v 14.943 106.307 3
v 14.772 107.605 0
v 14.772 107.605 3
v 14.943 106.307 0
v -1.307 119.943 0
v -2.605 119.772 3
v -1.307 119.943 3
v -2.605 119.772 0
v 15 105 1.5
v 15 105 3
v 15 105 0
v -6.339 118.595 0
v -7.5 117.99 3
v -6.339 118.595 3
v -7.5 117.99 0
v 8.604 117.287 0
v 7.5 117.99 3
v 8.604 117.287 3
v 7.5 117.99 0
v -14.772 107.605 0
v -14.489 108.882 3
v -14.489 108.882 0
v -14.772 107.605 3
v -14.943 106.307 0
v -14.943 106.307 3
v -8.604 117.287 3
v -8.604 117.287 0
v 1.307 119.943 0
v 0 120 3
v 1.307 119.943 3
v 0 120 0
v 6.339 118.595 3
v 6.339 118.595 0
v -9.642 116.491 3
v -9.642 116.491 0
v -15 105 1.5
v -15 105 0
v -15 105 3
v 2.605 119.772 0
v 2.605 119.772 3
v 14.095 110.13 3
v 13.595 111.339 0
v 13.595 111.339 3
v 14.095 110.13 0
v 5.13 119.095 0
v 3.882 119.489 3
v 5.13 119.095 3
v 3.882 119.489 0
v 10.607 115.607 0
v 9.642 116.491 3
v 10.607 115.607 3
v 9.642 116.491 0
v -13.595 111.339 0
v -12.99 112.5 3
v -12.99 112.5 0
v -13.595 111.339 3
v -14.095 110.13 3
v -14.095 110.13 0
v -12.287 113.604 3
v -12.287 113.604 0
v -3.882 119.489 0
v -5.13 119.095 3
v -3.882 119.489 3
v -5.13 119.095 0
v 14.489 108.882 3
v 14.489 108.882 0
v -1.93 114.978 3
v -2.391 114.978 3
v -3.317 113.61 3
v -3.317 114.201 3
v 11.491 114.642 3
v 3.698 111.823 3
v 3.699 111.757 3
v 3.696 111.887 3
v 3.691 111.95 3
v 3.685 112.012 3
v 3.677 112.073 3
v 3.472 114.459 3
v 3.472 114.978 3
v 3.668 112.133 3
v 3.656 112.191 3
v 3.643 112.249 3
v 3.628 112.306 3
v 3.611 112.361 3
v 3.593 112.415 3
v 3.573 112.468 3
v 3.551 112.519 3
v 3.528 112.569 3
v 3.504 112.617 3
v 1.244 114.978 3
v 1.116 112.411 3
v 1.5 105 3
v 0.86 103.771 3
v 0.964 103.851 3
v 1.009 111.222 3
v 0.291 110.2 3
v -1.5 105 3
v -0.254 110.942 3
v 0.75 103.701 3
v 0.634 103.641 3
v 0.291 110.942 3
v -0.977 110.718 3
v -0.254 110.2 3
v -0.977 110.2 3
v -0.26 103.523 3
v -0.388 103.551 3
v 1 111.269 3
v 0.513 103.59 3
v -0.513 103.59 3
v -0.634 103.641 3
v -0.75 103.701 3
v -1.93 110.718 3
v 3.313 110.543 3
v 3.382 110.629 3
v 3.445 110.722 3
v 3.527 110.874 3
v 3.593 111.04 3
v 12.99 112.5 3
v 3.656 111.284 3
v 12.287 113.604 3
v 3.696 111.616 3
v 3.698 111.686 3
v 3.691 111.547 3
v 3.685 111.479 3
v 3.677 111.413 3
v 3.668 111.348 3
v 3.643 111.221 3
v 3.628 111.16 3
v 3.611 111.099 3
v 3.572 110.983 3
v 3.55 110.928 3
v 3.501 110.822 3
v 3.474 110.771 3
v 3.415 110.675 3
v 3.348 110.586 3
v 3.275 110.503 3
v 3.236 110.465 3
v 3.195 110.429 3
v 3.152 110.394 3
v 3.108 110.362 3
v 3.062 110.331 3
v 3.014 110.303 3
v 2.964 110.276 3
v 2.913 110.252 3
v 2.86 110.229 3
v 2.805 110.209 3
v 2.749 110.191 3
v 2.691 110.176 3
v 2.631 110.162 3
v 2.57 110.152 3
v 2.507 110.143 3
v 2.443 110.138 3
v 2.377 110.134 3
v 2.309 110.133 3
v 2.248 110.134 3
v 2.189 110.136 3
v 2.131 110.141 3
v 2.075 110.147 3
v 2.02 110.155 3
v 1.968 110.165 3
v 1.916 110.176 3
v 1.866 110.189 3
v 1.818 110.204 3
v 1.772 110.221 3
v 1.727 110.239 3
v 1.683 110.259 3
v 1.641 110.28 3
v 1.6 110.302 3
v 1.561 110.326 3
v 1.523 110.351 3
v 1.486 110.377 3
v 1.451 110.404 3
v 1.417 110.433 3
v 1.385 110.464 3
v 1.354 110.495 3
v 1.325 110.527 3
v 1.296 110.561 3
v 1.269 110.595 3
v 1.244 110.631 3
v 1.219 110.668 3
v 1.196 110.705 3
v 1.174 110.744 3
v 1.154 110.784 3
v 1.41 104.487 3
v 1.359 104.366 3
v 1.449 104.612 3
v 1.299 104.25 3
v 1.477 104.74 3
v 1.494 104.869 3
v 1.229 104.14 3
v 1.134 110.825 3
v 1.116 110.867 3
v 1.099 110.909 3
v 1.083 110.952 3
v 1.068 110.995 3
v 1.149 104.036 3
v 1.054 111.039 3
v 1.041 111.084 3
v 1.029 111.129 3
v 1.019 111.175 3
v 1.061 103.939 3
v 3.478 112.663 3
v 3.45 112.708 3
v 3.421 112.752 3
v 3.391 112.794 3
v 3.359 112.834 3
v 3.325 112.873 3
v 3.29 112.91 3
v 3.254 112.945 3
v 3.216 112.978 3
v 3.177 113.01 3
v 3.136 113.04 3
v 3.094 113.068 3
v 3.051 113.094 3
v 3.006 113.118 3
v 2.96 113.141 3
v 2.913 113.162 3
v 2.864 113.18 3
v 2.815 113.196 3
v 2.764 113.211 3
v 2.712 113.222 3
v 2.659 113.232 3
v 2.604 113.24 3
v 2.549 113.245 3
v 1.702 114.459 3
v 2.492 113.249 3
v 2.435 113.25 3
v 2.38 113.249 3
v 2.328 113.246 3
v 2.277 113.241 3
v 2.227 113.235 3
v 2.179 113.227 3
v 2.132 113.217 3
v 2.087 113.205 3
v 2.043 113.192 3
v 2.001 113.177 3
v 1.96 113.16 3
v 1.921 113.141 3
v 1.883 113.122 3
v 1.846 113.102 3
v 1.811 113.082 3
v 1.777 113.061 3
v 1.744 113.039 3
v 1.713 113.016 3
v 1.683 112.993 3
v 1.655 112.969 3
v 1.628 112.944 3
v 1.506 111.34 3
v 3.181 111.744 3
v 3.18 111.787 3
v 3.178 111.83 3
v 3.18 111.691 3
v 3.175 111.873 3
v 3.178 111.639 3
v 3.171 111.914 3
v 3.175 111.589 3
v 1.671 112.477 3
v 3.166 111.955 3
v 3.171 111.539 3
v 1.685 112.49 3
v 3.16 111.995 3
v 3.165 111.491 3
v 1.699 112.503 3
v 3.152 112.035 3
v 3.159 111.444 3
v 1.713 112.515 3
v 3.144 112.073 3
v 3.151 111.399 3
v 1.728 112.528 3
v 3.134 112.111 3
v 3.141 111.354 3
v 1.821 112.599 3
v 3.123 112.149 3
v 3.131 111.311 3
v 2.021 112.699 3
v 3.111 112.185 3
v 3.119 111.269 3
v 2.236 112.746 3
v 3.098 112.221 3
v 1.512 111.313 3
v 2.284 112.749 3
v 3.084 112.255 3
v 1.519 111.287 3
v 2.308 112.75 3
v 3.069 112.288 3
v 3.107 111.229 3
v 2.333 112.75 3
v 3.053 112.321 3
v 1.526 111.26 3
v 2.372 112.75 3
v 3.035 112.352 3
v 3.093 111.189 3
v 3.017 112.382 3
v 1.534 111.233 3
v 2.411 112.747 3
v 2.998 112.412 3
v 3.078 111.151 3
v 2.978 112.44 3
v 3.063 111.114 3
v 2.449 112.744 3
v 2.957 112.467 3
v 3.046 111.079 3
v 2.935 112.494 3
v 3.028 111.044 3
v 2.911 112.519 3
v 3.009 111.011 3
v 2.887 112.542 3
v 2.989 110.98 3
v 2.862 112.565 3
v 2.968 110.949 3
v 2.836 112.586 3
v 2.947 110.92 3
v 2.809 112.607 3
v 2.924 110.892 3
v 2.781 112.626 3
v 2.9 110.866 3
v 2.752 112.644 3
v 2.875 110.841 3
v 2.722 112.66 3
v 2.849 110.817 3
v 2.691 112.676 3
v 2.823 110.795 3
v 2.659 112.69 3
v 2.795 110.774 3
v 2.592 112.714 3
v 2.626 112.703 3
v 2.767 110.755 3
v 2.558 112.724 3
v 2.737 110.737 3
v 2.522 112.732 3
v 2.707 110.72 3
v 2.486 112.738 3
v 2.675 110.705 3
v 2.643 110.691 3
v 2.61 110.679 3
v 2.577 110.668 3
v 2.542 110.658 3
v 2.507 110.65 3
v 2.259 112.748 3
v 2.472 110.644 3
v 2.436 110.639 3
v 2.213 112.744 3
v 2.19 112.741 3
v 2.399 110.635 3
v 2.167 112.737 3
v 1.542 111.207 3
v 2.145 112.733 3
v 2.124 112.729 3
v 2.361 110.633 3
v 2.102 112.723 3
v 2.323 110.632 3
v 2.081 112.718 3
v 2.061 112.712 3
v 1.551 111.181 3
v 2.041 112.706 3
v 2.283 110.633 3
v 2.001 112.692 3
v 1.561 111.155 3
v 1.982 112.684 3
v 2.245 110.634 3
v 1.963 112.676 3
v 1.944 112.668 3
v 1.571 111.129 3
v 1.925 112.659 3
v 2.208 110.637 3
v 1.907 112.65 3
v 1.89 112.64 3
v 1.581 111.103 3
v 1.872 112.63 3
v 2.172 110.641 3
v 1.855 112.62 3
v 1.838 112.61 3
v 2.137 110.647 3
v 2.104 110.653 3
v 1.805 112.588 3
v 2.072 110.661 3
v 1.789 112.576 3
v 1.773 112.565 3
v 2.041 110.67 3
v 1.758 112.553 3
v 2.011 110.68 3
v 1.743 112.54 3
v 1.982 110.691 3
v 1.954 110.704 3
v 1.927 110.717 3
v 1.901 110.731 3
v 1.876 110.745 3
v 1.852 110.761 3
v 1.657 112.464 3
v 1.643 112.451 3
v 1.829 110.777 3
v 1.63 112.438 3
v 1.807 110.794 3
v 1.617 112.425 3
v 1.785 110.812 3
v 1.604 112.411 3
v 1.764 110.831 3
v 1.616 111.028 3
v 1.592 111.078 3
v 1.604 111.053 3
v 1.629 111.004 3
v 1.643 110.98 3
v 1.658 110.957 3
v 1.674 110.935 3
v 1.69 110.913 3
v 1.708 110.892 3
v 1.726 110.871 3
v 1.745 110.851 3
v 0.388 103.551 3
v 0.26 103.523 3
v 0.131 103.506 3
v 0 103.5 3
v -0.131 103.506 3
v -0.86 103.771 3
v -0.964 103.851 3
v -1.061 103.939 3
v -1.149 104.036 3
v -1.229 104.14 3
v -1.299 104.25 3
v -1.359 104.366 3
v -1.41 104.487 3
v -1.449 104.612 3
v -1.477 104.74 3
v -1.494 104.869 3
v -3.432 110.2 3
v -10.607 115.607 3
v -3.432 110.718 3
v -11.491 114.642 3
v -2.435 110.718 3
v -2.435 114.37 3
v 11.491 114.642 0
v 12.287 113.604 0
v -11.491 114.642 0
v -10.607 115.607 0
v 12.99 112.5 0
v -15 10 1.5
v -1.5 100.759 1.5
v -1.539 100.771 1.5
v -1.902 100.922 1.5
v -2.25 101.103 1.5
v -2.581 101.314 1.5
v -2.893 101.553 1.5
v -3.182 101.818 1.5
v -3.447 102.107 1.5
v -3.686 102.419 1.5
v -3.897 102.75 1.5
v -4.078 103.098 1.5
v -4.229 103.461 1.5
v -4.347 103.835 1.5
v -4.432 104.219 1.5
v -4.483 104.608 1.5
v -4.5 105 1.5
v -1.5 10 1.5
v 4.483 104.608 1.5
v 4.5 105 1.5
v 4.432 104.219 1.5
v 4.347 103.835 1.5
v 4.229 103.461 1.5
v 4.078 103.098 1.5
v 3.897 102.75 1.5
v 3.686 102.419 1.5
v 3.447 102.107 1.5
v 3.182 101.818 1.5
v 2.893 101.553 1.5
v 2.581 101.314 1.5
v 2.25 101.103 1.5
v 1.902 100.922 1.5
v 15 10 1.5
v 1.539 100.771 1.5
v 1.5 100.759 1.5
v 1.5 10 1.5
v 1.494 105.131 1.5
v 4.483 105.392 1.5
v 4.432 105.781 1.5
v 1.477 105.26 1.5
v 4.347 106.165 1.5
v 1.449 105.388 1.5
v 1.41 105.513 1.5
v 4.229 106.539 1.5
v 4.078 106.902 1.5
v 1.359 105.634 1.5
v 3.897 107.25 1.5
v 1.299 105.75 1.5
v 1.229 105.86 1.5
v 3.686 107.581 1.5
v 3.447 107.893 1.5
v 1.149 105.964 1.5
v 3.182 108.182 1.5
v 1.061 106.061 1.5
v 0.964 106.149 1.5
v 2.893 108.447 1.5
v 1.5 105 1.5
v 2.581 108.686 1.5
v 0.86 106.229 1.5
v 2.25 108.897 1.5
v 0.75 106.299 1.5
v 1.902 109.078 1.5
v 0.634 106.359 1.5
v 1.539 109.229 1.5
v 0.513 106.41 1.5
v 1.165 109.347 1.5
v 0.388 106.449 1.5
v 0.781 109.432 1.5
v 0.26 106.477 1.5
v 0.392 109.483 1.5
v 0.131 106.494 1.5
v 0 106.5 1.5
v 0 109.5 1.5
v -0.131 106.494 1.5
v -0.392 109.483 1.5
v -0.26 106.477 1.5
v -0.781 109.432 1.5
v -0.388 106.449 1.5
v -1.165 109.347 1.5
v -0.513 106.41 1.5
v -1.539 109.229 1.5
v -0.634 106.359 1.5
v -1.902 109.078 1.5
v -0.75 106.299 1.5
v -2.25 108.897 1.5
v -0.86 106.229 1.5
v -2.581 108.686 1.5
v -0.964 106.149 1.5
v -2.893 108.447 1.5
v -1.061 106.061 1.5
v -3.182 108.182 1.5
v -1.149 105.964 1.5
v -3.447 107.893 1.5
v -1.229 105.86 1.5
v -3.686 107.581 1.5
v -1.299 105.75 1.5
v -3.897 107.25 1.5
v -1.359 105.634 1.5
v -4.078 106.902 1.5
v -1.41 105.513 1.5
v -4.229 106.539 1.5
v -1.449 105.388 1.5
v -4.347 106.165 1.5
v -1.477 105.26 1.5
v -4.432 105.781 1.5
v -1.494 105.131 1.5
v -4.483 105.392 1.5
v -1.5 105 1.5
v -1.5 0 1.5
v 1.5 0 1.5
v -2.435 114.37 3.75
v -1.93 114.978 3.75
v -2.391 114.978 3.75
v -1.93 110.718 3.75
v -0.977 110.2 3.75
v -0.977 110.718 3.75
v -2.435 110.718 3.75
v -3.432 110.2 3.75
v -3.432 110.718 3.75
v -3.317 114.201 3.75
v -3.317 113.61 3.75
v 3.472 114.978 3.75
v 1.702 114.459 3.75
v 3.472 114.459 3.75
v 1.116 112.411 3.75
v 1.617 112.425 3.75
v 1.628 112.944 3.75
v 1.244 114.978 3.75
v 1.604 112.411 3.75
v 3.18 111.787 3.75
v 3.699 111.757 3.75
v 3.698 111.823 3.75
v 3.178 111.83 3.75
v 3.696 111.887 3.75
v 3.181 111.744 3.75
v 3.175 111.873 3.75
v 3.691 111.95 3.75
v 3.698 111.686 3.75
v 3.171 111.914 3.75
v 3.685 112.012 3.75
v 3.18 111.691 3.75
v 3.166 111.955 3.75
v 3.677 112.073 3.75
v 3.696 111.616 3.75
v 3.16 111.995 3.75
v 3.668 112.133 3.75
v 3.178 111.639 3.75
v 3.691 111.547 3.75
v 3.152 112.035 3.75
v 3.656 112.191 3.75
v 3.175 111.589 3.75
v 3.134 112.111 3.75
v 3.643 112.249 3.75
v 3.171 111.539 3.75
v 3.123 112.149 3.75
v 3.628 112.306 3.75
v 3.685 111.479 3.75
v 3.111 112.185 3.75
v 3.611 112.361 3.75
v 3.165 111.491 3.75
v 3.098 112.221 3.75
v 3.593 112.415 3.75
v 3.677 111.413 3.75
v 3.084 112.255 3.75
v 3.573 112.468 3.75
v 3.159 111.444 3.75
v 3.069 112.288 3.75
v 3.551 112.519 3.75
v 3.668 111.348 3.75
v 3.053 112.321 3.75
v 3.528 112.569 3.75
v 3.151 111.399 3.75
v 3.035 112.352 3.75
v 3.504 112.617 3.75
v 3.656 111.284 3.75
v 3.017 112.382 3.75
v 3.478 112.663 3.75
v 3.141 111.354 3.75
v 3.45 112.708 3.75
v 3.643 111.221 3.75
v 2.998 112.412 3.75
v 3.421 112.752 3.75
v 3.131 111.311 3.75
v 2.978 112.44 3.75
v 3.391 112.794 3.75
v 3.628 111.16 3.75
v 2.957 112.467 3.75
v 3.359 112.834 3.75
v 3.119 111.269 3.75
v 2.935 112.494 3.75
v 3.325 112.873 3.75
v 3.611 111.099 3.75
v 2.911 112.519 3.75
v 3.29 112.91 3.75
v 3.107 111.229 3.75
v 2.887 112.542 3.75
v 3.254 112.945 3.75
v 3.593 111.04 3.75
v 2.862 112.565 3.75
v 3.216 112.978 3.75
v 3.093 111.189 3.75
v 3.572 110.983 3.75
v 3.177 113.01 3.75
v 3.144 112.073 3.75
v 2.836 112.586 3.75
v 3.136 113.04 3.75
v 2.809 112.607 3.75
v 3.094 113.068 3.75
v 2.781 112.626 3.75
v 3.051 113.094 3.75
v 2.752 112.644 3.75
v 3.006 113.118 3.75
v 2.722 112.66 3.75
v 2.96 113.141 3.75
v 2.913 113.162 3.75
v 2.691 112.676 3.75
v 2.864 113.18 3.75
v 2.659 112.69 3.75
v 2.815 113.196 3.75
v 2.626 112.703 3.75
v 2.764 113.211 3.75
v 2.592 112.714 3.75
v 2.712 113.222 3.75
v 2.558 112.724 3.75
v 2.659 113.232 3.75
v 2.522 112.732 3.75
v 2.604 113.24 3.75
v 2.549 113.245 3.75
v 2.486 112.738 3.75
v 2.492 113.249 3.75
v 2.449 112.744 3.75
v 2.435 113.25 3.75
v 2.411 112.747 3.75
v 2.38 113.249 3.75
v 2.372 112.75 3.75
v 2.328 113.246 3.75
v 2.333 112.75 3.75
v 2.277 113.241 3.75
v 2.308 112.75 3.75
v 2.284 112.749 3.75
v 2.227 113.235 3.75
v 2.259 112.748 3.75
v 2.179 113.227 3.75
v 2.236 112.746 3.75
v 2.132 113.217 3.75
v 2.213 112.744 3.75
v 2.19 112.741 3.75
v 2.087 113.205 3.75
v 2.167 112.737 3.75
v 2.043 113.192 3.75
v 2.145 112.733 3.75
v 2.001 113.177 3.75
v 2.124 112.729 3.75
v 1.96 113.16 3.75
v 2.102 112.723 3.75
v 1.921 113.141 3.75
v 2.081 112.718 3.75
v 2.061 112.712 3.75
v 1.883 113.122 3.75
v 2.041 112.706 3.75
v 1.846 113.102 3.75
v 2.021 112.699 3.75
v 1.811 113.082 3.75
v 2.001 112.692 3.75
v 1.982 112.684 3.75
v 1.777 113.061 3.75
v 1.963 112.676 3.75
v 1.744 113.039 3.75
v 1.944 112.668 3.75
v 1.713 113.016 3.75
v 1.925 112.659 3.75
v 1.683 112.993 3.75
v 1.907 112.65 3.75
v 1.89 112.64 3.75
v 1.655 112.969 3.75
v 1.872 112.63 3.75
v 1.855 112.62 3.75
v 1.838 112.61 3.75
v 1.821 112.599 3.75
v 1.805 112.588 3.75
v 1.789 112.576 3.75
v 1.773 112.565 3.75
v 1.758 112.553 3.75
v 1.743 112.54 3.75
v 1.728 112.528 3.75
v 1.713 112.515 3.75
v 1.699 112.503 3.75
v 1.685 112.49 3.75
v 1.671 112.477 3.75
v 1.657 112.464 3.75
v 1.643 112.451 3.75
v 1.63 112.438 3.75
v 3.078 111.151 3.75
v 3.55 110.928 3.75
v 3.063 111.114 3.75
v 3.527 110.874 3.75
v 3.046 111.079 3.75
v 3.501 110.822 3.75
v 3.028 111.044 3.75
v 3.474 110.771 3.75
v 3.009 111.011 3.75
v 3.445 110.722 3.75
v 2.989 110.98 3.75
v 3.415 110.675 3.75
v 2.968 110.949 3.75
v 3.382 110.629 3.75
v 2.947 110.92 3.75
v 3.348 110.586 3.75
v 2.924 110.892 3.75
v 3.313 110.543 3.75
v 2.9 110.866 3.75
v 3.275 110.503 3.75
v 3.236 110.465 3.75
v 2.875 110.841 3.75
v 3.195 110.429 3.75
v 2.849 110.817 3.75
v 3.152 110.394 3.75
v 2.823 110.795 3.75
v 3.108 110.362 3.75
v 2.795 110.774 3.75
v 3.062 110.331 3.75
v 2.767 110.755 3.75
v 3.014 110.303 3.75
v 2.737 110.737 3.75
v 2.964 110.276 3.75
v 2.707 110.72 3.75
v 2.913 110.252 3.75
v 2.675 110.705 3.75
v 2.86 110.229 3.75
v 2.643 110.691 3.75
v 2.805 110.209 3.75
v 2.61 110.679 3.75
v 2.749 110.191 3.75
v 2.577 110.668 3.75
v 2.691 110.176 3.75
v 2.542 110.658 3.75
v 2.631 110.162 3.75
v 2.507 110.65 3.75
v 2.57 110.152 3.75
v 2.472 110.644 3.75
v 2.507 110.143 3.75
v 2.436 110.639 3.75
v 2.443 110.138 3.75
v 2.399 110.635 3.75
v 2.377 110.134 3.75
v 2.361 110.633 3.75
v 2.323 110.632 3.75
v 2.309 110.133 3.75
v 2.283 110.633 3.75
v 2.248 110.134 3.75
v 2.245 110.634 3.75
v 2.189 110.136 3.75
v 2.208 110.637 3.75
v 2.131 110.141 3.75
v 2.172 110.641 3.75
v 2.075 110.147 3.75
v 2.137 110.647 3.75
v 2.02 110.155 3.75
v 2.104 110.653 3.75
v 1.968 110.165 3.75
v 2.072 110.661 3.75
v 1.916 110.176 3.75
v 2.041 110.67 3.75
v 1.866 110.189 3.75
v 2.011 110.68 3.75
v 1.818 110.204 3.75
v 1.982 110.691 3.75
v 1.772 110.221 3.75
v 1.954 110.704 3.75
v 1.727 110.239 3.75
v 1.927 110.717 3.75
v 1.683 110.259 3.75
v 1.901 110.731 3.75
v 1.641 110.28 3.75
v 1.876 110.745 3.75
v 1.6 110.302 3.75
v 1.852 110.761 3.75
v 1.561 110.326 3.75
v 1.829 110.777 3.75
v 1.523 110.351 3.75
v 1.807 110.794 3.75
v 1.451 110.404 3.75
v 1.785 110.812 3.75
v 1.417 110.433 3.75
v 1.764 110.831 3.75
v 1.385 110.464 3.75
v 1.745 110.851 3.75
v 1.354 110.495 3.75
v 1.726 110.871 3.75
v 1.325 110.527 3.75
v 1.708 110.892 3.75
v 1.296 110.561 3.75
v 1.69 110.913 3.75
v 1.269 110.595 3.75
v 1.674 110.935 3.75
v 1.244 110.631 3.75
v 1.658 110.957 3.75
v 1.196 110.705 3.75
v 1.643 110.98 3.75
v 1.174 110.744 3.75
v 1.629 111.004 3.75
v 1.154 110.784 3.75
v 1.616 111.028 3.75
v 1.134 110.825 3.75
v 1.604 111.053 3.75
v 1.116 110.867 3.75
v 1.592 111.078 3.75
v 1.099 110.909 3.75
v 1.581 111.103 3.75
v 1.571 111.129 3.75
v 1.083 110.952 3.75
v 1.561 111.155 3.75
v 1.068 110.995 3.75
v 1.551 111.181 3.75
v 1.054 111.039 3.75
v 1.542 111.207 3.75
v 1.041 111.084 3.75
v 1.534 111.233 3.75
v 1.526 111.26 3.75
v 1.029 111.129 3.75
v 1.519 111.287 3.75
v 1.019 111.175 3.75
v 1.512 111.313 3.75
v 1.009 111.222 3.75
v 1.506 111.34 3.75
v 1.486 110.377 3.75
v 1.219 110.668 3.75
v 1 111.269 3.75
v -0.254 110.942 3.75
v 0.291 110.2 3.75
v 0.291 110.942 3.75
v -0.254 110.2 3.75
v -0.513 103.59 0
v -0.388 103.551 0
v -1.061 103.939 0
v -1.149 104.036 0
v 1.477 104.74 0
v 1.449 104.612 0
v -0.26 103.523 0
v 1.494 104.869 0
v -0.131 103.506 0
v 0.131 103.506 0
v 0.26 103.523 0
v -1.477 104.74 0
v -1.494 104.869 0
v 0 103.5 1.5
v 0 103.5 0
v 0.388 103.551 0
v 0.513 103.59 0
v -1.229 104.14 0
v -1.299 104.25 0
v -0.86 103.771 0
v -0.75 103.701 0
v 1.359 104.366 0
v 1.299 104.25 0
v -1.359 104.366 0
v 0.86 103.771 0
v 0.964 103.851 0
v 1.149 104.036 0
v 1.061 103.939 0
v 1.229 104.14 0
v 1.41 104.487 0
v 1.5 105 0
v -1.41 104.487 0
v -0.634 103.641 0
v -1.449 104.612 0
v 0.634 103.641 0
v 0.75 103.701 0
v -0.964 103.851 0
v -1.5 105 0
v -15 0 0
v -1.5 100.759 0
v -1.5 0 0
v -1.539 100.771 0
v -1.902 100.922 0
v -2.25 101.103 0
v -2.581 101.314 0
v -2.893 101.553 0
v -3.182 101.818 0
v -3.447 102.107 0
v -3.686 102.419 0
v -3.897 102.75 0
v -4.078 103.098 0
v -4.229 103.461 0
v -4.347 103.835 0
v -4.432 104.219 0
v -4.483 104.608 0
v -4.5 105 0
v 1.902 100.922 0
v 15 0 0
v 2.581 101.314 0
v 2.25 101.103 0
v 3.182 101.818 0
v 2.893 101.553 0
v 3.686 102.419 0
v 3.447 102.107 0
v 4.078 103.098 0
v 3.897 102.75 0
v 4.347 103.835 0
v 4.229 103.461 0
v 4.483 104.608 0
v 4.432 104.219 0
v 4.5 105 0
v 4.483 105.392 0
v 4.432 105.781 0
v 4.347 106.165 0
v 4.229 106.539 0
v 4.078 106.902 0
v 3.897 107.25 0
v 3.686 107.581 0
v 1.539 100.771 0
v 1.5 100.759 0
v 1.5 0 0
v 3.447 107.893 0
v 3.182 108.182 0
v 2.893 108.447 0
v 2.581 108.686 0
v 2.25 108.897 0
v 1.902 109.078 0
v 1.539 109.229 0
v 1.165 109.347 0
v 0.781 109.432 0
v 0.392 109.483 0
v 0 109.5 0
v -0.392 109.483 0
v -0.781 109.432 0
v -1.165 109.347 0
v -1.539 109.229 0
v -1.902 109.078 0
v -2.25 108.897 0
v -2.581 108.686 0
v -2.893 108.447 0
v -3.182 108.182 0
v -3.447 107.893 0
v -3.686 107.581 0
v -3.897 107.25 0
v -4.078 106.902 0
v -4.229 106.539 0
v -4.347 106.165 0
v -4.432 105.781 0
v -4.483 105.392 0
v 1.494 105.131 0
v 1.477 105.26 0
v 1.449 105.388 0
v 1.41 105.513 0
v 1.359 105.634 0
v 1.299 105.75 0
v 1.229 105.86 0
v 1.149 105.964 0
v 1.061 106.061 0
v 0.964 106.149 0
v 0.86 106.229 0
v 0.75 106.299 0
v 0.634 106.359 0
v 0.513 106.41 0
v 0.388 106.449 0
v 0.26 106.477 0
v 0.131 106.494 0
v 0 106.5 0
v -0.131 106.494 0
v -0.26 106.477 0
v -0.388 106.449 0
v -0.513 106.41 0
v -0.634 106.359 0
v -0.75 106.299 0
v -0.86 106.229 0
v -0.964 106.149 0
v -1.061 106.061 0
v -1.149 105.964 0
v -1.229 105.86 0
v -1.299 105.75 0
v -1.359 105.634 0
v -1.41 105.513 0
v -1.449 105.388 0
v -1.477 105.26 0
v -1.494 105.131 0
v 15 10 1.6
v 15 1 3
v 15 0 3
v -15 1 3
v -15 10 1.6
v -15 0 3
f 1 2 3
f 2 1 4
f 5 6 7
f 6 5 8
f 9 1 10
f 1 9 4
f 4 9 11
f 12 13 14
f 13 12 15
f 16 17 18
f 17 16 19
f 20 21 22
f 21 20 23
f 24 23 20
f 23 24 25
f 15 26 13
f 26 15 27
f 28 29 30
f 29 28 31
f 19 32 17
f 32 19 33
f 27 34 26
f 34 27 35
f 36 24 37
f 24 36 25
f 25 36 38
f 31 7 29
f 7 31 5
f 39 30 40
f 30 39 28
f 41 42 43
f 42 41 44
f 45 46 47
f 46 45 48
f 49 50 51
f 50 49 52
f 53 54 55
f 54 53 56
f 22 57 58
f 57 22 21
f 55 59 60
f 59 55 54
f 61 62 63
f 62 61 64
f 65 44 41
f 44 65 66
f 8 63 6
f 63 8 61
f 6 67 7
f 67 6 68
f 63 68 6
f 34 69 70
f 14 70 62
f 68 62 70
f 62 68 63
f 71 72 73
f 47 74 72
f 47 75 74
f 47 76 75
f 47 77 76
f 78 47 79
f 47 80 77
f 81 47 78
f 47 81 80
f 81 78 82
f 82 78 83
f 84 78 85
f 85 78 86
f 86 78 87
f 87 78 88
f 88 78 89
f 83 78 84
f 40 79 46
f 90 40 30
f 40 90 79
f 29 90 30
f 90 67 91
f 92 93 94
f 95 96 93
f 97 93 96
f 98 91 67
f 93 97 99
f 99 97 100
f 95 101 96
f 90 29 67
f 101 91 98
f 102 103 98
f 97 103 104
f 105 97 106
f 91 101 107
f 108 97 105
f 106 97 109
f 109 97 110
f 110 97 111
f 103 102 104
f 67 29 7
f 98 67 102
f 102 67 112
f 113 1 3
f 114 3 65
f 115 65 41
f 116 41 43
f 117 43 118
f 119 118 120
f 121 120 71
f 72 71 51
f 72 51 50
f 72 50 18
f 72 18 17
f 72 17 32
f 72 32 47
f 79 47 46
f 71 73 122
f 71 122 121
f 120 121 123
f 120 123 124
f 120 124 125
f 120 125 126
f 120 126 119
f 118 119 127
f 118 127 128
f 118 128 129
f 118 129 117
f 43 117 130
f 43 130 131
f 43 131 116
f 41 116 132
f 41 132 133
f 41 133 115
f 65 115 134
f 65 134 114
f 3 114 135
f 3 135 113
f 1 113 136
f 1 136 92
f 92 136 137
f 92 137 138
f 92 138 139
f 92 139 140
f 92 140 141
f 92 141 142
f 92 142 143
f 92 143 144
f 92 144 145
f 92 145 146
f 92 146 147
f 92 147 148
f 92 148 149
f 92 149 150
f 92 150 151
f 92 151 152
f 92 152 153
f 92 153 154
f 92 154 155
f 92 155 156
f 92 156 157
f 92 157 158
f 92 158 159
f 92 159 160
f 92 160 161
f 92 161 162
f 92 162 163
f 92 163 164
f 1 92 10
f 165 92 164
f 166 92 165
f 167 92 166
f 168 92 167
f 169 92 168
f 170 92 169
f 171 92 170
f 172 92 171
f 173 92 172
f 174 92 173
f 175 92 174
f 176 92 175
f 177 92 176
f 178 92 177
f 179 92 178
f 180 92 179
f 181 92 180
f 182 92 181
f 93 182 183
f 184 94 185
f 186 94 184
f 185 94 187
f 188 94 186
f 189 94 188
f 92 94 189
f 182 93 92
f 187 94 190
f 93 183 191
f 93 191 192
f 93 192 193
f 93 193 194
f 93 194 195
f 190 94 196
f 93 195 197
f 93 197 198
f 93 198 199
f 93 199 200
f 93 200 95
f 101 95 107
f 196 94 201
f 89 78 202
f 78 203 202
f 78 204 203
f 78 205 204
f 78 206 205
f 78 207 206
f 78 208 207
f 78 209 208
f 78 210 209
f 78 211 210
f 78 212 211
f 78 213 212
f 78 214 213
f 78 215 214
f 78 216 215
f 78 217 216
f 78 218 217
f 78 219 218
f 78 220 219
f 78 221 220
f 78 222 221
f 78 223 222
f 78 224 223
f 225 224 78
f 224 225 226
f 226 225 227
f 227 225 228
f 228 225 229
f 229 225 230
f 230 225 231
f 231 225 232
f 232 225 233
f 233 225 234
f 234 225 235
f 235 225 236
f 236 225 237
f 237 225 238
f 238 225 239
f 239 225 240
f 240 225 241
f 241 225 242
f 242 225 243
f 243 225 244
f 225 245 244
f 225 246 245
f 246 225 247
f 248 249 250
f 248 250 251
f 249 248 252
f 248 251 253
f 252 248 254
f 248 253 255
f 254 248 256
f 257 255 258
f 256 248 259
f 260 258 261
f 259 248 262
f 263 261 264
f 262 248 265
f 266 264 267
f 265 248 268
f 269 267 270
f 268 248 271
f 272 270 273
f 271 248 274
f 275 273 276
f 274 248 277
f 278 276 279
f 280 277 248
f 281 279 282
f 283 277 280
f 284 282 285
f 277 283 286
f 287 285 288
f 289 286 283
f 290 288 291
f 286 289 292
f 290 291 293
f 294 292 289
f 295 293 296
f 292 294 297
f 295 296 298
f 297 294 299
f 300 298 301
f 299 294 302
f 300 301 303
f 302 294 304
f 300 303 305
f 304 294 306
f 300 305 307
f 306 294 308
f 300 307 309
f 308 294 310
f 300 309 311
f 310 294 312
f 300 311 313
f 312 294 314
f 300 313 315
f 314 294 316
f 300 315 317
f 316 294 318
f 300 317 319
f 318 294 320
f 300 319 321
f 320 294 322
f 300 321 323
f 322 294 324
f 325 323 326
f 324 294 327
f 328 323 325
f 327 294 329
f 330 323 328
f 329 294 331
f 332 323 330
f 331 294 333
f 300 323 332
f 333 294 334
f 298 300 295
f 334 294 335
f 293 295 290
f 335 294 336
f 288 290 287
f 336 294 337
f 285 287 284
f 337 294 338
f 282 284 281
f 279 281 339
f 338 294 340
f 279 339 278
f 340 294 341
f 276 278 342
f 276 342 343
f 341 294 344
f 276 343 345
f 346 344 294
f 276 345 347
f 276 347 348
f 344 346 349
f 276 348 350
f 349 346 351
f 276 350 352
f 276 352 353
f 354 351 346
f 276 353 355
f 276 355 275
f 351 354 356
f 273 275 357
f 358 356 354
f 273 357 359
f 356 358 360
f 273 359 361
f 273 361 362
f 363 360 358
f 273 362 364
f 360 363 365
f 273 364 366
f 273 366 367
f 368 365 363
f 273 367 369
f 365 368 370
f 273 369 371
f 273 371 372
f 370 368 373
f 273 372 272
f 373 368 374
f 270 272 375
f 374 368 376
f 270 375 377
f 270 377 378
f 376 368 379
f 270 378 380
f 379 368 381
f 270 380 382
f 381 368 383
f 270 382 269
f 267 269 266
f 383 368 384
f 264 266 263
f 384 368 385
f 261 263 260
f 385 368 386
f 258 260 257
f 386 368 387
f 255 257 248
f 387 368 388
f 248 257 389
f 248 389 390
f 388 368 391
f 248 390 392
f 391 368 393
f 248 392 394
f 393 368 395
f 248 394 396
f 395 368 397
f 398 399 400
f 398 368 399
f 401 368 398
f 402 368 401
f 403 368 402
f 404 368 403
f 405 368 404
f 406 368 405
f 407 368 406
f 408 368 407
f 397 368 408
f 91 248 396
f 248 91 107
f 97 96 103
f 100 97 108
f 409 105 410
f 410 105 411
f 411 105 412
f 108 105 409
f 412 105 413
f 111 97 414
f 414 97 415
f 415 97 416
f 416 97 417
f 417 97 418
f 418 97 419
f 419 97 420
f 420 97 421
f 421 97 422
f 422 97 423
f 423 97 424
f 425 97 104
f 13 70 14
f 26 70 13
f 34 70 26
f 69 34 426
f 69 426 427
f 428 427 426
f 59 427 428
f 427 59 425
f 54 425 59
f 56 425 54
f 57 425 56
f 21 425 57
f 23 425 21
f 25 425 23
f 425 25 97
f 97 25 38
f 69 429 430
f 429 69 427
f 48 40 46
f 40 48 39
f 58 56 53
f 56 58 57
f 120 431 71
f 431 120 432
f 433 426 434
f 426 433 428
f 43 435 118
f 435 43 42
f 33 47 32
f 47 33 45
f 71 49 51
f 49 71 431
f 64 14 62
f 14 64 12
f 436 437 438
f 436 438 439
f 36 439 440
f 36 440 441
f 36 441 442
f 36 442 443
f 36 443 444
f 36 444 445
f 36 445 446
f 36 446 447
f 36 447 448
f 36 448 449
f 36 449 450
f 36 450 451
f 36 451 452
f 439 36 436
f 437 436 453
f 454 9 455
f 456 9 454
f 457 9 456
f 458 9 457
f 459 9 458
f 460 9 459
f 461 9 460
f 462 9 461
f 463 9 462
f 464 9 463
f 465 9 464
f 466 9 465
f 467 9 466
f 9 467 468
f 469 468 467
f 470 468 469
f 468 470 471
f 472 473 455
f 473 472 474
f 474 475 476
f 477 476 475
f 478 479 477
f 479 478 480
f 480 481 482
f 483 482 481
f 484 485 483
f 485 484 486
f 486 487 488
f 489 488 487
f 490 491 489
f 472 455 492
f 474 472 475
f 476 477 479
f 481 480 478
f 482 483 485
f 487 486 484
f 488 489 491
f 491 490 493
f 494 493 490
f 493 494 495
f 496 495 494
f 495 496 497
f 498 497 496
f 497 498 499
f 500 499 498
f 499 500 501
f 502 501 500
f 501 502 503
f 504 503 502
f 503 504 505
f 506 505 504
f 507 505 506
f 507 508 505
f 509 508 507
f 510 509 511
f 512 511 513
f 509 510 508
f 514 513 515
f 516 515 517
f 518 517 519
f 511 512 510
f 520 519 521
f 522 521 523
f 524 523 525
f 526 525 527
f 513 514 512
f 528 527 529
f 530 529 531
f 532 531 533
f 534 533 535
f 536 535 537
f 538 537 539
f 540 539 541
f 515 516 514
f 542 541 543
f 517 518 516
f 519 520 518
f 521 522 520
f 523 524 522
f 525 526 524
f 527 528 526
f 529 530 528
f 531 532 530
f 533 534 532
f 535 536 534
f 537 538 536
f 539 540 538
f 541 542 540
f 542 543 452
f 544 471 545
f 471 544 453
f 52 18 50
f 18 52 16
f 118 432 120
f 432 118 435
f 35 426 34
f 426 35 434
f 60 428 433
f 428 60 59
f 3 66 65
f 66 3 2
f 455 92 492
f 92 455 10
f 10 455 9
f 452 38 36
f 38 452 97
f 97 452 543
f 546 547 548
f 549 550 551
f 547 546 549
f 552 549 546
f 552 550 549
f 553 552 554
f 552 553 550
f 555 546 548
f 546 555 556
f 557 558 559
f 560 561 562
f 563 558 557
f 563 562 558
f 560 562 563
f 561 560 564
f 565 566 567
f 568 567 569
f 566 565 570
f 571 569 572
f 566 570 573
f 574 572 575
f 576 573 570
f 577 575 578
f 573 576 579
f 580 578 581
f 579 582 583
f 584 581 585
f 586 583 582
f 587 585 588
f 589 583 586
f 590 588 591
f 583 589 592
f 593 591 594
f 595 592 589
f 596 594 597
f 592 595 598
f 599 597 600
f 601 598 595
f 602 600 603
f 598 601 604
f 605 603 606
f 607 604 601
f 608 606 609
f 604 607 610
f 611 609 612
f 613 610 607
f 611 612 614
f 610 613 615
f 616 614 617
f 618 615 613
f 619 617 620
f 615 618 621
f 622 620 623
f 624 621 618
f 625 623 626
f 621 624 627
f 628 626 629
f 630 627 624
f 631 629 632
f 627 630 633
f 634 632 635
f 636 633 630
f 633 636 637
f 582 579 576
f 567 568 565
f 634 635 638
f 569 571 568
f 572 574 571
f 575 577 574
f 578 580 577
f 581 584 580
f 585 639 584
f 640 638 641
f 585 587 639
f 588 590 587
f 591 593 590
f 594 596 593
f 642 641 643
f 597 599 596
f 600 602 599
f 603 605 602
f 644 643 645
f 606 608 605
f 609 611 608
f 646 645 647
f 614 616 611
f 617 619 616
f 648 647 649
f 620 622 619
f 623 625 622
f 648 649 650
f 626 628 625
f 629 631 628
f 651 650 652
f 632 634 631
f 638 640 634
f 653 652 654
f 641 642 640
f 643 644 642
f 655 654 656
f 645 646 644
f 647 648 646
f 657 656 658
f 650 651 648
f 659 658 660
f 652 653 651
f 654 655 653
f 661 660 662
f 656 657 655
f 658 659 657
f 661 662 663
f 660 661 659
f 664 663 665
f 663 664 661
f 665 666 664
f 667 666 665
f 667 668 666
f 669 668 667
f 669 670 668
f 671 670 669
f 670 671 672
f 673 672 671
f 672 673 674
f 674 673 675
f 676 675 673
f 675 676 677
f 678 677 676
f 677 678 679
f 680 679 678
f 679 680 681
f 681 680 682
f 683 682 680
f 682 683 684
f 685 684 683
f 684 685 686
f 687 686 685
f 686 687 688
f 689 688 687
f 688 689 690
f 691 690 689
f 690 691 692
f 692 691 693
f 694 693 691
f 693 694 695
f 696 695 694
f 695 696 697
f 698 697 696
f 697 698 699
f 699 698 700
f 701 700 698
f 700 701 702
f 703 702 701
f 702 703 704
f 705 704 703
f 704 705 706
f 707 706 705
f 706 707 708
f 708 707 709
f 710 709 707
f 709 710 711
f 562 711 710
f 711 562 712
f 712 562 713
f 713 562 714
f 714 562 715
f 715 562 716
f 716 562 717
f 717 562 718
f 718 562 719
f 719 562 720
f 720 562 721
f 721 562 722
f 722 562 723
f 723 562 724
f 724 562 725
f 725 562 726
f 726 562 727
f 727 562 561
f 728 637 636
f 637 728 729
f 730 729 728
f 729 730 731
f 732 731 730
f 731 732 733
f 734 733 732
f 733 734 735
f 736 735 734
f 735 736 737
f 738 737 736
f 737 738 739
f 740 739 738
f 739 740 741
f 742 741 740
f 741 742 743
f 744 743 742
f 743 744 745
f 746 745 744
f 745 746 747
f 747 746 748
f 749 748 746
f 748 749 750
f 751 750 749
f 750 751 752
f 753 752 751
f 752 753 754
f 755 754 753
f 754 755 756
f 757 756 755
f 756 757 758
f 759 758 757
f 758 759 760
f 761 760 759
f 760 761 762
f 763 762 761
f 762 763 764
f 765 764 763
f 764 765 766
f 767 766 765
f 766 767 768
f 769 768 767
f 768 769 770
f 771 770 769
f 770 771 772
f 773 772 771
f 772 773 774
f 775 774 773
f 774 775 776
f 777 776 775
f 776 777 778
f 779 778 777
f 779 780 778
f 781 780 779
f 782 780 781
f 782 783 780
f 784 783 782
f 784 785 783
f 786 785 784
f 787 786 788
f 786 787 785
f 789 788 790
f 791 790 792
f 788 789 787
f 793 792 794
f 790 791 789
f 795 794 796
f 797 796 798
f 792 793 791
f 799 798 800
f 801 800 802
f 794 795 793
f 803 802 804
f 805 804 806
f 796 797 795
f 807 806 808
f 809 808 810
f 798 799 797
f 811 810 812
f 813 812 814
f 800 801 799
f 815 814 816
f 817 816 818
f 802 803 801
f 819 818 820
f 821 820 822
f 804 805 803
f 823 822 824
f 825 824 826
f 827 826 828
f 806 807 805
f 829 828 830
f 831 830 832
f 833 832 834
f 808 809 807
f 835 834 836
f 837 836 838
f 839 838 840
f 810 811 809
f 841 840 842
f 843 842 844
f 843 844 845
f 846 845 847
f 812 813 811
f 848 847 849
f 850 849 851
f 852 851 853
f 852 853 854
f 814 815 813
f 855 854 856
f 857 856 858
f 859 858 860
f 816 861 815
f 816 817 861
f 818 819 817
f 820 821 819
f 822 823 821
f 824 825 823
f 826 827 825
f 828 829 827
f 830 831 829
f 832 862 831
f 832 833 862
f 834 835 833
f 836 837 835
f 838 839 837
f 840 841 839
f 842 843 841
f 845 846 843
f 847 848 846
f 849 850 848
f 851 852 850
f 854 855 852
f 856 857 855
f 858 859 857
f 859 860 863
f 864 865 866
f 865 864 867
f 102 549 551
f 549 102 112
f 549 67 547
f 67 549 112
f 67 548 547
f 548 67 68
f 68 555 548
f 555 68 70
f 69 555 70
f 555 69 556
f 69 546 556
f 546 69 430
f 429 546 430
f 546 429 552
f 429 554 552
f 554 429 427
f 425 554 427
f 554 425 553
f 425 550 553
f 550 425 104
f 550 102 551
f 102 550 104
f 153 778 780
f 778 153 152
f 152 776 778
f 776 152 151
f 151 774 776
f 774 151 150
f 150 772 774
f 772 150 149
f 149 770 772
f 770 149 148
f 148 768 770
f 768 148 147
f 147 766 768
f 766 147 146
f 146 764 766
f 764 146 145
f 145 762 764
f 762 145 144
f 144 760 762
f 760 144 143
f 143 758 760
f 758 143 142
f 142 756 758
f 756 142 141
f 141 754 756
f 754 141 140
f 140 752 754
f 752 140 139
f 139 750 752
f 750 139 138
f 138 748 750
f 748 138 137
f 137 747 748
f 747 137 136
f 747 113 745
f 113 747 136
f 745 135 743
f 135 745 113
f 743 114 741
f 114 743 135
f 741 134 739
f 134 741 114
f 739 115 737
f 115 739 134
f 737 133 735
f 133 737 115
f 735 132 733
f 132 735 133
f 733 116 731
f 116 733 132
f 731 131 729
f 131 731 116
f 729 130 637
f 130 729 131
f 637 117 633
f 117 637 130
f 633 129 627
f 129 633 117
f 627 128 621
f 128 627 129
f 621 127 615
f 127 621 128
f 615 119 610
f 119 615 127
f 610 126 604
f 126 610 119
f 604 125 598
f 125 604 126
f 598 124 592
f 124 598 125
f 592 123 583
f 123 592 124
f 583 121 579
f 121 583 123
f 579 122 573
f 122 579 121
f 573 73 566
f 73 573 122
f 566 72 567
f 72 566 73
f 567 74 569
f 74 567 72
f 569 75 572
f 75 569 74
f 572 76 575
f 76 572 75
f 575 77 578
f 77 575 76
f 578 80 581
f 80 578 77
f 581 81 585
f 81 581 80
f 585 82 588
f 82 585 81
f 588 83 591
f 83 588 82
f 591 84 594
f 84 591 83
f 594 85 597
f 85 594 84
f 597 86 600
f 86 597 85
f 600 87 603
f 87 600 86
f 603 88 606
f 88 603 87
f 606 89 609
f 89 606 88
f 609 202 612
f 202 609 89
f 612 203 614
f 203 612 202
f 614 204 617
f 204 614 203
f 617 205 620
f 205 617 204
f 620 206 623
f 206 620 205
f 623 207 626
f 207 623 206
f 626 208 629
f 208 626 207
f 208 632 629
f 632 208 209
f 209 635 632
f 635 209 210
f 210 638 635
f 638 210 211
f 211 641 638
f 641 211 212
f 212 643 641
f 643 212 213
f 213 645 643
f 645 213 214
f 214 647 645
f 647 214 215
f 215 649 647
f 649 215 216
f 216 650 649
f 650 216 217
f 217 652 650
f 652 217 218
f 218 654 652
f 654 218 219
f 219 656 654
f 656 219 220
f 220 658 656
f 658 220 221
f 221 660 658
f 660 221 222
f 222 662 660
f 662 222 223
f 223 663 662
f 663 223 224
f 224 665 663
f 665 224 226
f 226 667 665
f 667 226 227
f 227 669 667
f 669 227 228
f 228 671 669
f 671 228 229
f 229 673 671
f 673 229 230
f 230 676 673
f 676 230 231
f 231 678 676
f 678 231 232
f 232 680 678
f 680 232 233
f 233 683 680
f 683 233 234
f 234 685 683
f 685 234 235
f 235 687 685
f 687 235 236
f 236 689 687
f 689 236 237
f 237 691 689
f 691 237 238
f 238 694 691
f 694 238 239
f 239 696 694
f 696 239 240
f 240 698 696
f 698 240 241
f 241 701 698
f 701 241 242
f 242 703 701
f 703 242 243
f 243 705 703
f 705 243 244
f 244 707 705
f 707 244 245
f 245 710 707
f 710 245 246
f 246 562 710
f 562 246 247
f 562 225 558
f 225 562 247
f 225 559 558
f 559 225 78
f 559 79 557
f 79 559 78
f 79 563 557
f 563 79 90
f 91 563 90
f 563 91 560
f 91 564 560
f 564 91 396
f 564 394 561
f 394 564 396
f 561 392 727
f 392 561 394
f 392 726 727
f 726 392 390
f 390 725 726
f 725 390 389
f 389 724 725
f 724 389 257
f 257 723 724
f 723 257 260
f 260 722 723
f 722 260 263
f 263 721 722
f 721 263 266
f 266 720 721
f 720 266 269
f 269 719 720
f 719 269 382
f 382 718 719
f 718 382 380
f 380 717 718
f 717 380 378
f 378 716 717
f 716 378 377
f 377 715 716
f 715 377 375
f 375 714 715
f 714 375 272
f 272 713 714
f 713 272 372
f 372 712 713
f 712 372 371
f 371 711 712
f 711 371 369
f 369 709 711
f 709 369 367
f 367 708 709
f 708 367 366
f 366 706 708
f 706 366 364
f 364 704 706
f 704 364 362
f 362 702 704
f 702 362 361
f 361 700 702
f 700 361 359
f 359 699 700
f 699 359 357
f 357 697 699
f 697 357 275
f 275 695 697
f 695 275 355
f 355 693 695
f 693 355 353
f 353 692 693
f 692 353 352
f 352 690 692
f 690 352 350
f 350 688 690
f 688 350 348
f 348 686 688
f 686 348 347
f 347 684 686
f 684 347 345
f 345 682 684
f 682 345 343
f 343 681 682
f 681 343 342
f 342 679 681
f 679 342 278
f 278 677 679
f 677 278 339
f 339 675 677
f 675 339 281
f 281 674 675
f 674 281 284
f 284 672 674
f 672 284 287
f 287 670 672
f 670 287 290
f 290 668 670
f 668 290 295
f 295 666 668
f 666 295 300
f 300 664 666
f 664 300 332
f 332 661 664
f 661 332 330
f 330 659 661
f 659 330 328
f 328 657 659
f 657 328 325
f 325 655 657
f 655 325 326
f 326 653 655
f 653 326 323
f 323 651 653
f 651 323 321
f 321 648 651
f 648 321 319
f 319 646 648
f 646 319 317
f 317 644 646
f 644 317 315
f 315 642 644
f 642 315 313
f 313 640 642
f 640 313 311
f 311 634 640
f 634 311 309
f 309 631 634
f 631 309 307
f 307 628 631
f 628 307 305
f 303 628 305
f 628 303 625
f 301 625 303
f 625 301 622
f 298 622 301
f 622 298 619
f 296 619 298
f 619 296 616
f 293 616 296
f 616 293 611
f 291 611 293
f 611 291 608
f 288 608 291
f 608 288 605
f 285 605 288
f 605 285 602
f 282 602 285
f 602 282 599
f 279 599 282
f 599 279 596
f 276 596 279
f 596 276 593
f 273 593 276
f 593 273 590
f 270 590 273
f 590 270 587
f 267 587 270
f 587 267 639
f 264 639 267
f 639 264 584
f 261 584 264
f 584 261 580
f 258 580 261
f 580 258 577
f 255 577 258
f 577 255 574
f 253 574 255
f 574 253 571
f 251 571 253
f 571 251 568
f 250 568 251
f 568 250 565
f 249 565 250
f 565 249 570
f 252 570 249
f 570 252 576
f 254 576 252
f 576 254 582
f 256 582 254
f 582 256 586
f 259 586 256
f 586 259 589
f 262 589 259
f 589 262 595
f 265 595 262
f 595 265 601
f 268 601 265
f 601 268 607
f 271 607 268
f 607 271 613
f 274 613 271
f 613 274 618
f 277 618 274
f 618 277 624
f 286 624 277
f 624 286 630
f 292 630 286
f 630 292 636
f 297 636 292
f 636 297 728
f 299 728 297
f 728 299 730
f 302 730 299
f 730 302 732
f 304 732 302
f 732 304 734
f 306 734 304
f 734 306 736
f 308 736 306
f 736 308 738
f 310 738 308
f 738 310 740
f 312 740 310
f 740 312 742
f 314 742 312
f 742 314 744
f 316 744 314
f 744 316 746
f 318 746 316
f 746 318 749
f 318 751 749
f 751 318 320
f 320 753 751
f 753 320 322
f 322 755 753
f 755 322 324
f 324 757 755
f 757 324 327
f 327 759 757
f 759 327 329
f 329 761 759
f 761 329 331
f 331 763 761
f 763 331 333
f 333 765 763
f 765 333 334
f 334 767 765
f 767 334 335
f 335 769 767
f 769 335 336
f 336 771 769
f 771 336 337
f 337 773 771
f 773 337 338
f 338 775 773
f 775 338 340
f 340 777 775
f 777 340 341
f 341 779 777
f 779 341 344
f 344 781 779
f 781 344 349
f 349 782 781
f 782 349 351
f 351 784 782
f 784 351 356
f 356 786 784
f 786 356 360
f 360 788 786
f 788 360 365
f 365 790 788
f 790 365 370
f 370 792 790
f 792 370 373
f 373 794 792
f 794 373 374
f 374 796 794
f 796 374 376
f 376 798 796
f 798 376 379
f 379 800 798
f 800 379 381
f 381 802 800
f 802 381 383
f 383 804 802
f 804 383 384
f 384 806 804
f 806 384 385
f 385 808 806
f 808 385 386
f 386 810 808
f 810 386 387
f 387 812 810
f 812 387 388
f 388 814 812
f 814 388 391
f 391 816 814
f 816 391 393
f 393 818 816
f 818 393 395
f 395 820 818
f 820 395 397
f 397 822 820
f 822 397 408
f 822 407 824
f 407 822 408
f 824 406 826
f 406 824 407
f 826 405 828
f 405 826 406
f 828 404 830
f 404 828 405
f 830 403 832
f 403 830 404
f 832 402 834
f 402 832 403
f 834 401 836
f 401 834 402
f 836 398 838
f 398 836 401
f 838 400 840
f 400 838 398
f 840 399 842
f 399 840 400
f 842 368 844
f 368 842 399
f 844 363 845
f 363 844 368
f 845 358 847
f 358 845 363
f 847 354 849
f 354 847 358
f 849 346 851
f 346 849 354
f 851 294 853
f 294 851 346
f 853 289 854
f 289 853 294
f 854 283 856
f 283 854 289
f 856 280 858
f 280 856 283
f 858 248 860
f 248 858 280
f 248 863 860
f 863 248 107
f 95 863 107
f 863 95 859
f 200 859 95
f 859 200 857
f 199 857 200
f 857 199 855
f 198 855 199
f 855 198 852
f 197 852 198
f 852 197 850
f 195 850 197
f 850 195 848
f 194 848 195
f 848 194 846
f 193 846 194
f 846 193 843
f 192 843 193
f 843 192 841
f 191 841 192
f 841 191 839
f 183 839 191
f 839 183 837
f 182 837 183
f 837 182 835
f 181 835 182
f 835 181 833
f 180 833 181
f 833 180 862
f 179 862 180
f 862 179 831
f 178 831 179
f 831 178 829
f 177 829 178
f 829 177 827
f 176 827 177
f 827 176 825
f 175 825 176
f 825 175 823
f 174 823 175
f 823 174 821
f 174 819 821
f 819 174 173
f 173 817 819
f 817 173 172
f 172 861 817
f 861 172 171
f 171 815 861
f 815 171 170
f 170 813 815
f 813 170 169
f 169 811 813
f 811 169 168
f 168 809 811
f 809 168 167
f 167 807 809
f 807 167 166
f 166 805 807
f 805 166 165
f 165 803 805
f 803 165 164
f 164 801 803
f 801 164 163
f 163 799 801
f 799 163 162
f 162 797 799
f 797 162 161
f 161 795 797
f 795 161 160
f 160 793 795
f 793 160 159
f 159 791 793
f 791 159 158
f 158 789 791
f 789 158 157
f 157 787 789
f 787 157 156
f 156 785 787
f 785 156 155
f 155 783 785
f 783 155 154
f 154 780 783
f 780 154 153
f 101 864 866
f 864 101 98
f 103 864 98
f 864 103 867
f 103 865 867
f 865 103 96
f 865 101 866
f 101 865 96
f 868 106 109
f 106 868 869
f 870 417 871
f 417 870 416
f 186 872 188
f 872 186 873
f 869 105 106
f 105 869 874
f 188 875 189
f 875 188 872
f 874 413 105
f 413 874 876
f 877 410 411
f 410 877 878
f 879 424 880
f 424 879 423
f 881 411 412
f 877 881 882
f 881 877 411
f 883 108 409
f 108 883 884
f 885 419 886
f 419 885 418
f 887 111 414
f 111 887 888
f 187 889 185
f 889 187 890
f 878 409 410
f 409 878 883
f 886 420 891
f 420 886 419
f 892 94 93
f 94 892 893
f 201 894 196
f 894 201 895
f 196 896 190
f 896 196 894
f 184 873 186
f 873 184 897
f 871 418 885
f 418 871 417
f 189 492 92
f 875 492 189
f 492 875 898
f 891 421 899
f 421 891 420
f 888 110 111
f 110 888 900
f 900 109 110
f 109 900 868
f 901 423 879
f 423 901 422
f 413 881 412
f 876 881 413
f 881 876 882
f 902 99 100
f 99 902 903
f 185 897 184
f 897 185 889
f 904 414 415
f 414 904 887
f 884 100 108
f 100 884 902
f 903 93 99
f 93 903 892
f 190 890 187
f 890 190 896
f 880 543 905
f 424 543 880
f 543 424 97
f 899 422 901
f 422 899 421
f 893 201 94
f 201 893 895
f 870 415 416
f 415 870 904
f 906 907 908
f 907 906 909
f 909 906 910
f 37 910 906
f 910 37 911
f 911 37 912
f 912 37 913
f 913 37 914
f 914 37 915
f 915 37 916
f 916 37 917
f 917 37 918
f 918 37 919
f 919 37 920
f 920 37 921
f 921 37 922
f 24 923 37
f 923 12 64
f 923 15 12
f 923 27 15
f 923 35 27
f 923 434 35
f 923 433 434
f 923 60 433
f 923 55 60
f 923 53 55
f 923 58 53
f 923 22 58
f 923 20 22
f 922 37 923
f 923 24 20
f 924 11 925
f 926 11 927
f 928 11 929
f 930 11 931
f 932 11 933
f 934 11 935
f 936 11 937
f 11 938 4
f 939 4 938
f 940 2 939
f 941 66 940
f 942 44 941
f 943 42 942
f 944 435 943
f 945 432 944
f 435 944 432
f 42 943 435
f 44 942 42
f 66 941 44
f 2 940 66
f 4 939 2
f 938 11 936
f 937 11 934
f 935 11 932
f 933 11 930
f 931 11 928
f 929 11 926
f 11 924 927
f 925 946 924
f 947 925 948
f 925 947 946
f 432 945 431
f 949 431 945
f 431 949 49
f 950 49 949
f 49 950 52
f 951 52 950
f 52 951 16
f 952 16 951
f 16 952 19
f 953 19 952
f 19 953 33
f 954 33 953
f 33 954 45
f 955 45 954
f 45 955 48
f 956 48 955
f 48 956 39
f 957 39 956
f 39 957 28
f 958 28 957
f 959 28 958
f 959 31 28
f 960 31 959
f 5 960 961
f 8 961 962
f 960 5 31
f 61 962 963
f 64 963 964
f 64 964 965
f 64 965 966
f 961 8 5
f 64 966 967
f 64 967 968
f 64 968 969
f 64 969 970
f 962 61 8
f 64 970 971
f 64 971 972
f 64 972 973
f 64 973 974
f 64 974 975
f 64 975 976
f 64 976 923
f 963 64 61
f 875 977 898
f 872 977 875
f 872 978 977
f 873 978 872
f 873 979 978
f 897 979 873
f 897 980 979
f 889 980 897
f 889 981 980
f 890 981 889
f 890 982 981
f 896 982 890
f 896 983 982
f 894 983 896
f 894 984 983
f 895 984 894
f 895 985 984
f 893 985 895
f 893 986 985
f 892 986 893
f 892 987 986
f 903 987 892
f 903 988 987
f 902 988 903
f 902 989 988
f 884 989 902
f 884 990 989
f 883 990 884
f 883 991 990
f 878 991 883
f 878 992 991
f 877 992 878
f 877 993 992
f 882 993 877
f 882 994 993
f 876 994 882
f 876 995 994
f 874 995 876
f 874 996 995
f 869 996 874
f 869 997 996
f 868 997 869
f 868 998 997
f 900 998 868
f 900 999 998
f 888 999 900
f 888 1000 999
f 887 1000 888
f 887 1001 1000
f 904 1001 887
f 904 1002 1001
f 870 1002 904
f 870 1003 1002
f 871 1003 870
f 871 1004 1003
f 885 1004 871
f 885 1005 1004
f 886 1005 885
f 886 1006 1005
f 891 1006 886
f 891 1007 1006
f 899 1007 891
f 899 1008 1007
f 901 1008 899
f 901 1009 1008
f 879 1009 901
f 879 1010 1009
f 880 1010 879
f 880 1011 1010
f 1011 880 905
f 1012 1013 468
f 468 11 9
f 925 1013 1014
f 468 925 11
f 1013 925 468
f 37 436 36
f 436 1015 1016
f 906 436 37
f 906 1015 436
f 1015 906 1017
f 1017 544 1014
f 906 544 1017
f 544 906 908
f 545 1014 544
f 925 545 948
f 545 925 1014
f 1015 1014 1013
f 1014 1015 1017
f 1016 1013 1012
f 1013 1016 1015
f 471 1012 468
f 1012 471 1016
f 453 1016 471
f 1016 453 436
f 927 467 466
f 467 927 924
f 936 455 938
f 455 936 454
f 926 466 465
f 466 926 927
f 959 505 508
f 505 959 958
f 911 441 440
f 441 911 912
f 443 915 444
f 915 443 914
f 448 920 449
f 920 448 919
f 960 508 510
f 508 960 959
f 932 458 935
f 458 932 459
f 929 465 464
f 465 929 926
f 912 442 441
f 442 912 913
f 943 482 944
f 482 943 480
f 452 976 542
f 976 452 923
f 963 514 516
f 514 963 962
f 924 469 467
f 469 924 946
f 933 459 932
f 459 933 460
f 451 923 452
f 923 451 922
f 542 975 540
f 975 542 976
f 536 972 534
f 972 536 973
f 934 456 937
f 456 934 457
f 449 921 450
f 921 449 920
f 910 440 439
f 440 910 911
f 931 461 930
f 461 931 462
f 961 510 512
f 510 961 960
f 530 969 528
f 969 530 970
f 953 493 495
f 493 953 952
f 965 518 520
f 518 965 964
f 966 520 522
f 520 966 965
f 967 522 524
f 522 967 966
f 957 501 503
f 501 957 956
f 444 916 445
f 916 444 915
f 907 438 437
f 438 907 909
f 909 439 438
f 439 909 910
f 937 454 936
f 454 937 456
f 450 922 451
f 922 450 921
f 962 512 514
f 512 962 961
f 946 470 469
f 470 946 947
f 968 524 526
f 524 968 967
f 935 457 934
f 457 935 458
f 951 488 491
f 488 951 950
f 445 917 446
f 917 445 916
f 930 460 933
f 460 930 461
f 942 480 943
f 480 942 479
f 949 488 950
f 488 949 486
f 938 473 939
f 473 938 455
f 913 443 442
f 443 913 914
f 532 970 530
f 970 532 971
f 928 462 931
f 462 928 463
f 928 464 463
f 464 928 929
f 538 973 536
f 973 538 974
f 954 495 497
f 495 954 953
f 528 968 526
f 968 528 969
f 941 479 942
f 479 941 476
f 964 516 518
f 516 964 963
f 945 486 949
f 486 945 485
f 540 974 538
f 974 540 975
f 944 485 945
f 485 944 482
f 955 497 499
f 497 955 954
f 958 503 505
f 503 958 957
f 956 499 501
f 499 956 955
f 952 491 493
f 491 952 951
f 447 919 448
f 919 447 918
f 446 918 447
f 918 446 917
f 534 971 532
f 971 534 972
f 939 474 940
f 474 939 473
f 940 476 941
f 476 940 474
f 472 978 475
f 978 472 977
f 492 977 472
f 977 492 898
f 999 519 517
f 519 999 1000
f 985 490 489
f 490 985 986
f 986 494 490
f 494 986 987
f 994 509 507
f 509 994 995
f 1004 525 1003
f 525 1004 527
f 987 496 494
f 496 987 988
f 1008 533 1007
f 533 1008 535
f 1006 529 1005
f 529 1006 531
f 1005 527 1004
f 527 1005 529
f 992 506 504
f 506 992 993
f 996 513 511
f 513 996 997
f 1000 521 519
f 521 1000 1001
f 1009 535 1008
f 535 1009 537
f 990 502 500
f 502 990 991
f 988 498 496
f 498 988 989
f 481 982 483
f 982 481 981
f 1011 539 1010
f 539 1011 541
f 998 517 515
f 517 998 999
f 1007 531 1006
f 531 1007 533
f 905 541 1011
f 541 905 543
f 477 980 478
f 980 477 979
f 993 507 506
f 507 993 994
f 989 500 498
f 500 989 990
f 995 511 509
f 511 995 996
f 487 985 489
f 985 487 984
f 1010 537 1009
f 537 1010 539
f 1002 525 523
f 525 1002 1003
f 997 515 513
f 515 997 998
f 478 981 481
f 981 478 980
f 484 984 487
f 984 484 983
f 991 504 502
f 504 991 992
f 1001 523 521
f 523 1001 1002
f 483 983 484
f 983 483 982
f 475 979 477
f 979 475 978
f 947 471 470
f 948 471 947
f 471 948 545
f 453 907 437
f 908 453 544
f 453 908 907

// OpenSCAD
machine_foot_width = 15;
rope_diameter = 1.5;
length = 120;


$fn = 72;
rope_holder_width = machine_foot_width *2;
pin_diameter = rope_diameter * 2;
pin_space_diameter = pin_diameter + (rope_diameter *4);

runout_space = 10;



circle_diameter = min(pin_space_diameter*4, rope_holder_width);

module pin_cutout() {
    difference() {
        linear_extrude(height=rope_diameter) circle(d=pin_space_diameter);
        linear_extrude(height=rope_diameter) circle(d=pin_diameter);
    }
}

module half_circle_with_text(d, height) {
    translate([0,0,height]) {
        difference() {
            linear_extrude(height=height) circle(d=d);
            translate([-d/2,-d/2,0]) cube([d,d/2,height]);
        }
        translate([0,d/4,height]) linear_extrude(height=height/2) text(str(rope_diameter), font = "Nimbus Sans Narrow:style=Regular", size=5, valign="center",halign="center");
        linear_extrude(height=height) circle(d=pin_diameter);
    }
    linear_extrude(height=height) circle(d=d);
    
}

difference() {
    union(){
        translate([-rope_holder_width/2,0,0]) cube([rope_holder_width, length-(circle_diameter/2), rope_diameter]);
        translate([0,length-(circle_diameter/2), 0]) half_circle_with_text(d=circle_diameter, height=rope_diameter);
        translate([-rope_holder_width/2,0,rope_diameter]) {
            hull() {
                cube([rope_holder_width, 1, rope_diameter]);
                translate([0,runout_space-1,0]) cube([rope_holder_width, 1, 0.1]);
            }
        }
    }
    union(){
        ce=(length-circle_diameter/2);
        translate([-rope_diameter,0,0]) cube([2*rope_diameter, ce-pin_diameter/2, rope_diameter]);
        translate([0,ce,0]) pin_cutout();
    }
        
}
